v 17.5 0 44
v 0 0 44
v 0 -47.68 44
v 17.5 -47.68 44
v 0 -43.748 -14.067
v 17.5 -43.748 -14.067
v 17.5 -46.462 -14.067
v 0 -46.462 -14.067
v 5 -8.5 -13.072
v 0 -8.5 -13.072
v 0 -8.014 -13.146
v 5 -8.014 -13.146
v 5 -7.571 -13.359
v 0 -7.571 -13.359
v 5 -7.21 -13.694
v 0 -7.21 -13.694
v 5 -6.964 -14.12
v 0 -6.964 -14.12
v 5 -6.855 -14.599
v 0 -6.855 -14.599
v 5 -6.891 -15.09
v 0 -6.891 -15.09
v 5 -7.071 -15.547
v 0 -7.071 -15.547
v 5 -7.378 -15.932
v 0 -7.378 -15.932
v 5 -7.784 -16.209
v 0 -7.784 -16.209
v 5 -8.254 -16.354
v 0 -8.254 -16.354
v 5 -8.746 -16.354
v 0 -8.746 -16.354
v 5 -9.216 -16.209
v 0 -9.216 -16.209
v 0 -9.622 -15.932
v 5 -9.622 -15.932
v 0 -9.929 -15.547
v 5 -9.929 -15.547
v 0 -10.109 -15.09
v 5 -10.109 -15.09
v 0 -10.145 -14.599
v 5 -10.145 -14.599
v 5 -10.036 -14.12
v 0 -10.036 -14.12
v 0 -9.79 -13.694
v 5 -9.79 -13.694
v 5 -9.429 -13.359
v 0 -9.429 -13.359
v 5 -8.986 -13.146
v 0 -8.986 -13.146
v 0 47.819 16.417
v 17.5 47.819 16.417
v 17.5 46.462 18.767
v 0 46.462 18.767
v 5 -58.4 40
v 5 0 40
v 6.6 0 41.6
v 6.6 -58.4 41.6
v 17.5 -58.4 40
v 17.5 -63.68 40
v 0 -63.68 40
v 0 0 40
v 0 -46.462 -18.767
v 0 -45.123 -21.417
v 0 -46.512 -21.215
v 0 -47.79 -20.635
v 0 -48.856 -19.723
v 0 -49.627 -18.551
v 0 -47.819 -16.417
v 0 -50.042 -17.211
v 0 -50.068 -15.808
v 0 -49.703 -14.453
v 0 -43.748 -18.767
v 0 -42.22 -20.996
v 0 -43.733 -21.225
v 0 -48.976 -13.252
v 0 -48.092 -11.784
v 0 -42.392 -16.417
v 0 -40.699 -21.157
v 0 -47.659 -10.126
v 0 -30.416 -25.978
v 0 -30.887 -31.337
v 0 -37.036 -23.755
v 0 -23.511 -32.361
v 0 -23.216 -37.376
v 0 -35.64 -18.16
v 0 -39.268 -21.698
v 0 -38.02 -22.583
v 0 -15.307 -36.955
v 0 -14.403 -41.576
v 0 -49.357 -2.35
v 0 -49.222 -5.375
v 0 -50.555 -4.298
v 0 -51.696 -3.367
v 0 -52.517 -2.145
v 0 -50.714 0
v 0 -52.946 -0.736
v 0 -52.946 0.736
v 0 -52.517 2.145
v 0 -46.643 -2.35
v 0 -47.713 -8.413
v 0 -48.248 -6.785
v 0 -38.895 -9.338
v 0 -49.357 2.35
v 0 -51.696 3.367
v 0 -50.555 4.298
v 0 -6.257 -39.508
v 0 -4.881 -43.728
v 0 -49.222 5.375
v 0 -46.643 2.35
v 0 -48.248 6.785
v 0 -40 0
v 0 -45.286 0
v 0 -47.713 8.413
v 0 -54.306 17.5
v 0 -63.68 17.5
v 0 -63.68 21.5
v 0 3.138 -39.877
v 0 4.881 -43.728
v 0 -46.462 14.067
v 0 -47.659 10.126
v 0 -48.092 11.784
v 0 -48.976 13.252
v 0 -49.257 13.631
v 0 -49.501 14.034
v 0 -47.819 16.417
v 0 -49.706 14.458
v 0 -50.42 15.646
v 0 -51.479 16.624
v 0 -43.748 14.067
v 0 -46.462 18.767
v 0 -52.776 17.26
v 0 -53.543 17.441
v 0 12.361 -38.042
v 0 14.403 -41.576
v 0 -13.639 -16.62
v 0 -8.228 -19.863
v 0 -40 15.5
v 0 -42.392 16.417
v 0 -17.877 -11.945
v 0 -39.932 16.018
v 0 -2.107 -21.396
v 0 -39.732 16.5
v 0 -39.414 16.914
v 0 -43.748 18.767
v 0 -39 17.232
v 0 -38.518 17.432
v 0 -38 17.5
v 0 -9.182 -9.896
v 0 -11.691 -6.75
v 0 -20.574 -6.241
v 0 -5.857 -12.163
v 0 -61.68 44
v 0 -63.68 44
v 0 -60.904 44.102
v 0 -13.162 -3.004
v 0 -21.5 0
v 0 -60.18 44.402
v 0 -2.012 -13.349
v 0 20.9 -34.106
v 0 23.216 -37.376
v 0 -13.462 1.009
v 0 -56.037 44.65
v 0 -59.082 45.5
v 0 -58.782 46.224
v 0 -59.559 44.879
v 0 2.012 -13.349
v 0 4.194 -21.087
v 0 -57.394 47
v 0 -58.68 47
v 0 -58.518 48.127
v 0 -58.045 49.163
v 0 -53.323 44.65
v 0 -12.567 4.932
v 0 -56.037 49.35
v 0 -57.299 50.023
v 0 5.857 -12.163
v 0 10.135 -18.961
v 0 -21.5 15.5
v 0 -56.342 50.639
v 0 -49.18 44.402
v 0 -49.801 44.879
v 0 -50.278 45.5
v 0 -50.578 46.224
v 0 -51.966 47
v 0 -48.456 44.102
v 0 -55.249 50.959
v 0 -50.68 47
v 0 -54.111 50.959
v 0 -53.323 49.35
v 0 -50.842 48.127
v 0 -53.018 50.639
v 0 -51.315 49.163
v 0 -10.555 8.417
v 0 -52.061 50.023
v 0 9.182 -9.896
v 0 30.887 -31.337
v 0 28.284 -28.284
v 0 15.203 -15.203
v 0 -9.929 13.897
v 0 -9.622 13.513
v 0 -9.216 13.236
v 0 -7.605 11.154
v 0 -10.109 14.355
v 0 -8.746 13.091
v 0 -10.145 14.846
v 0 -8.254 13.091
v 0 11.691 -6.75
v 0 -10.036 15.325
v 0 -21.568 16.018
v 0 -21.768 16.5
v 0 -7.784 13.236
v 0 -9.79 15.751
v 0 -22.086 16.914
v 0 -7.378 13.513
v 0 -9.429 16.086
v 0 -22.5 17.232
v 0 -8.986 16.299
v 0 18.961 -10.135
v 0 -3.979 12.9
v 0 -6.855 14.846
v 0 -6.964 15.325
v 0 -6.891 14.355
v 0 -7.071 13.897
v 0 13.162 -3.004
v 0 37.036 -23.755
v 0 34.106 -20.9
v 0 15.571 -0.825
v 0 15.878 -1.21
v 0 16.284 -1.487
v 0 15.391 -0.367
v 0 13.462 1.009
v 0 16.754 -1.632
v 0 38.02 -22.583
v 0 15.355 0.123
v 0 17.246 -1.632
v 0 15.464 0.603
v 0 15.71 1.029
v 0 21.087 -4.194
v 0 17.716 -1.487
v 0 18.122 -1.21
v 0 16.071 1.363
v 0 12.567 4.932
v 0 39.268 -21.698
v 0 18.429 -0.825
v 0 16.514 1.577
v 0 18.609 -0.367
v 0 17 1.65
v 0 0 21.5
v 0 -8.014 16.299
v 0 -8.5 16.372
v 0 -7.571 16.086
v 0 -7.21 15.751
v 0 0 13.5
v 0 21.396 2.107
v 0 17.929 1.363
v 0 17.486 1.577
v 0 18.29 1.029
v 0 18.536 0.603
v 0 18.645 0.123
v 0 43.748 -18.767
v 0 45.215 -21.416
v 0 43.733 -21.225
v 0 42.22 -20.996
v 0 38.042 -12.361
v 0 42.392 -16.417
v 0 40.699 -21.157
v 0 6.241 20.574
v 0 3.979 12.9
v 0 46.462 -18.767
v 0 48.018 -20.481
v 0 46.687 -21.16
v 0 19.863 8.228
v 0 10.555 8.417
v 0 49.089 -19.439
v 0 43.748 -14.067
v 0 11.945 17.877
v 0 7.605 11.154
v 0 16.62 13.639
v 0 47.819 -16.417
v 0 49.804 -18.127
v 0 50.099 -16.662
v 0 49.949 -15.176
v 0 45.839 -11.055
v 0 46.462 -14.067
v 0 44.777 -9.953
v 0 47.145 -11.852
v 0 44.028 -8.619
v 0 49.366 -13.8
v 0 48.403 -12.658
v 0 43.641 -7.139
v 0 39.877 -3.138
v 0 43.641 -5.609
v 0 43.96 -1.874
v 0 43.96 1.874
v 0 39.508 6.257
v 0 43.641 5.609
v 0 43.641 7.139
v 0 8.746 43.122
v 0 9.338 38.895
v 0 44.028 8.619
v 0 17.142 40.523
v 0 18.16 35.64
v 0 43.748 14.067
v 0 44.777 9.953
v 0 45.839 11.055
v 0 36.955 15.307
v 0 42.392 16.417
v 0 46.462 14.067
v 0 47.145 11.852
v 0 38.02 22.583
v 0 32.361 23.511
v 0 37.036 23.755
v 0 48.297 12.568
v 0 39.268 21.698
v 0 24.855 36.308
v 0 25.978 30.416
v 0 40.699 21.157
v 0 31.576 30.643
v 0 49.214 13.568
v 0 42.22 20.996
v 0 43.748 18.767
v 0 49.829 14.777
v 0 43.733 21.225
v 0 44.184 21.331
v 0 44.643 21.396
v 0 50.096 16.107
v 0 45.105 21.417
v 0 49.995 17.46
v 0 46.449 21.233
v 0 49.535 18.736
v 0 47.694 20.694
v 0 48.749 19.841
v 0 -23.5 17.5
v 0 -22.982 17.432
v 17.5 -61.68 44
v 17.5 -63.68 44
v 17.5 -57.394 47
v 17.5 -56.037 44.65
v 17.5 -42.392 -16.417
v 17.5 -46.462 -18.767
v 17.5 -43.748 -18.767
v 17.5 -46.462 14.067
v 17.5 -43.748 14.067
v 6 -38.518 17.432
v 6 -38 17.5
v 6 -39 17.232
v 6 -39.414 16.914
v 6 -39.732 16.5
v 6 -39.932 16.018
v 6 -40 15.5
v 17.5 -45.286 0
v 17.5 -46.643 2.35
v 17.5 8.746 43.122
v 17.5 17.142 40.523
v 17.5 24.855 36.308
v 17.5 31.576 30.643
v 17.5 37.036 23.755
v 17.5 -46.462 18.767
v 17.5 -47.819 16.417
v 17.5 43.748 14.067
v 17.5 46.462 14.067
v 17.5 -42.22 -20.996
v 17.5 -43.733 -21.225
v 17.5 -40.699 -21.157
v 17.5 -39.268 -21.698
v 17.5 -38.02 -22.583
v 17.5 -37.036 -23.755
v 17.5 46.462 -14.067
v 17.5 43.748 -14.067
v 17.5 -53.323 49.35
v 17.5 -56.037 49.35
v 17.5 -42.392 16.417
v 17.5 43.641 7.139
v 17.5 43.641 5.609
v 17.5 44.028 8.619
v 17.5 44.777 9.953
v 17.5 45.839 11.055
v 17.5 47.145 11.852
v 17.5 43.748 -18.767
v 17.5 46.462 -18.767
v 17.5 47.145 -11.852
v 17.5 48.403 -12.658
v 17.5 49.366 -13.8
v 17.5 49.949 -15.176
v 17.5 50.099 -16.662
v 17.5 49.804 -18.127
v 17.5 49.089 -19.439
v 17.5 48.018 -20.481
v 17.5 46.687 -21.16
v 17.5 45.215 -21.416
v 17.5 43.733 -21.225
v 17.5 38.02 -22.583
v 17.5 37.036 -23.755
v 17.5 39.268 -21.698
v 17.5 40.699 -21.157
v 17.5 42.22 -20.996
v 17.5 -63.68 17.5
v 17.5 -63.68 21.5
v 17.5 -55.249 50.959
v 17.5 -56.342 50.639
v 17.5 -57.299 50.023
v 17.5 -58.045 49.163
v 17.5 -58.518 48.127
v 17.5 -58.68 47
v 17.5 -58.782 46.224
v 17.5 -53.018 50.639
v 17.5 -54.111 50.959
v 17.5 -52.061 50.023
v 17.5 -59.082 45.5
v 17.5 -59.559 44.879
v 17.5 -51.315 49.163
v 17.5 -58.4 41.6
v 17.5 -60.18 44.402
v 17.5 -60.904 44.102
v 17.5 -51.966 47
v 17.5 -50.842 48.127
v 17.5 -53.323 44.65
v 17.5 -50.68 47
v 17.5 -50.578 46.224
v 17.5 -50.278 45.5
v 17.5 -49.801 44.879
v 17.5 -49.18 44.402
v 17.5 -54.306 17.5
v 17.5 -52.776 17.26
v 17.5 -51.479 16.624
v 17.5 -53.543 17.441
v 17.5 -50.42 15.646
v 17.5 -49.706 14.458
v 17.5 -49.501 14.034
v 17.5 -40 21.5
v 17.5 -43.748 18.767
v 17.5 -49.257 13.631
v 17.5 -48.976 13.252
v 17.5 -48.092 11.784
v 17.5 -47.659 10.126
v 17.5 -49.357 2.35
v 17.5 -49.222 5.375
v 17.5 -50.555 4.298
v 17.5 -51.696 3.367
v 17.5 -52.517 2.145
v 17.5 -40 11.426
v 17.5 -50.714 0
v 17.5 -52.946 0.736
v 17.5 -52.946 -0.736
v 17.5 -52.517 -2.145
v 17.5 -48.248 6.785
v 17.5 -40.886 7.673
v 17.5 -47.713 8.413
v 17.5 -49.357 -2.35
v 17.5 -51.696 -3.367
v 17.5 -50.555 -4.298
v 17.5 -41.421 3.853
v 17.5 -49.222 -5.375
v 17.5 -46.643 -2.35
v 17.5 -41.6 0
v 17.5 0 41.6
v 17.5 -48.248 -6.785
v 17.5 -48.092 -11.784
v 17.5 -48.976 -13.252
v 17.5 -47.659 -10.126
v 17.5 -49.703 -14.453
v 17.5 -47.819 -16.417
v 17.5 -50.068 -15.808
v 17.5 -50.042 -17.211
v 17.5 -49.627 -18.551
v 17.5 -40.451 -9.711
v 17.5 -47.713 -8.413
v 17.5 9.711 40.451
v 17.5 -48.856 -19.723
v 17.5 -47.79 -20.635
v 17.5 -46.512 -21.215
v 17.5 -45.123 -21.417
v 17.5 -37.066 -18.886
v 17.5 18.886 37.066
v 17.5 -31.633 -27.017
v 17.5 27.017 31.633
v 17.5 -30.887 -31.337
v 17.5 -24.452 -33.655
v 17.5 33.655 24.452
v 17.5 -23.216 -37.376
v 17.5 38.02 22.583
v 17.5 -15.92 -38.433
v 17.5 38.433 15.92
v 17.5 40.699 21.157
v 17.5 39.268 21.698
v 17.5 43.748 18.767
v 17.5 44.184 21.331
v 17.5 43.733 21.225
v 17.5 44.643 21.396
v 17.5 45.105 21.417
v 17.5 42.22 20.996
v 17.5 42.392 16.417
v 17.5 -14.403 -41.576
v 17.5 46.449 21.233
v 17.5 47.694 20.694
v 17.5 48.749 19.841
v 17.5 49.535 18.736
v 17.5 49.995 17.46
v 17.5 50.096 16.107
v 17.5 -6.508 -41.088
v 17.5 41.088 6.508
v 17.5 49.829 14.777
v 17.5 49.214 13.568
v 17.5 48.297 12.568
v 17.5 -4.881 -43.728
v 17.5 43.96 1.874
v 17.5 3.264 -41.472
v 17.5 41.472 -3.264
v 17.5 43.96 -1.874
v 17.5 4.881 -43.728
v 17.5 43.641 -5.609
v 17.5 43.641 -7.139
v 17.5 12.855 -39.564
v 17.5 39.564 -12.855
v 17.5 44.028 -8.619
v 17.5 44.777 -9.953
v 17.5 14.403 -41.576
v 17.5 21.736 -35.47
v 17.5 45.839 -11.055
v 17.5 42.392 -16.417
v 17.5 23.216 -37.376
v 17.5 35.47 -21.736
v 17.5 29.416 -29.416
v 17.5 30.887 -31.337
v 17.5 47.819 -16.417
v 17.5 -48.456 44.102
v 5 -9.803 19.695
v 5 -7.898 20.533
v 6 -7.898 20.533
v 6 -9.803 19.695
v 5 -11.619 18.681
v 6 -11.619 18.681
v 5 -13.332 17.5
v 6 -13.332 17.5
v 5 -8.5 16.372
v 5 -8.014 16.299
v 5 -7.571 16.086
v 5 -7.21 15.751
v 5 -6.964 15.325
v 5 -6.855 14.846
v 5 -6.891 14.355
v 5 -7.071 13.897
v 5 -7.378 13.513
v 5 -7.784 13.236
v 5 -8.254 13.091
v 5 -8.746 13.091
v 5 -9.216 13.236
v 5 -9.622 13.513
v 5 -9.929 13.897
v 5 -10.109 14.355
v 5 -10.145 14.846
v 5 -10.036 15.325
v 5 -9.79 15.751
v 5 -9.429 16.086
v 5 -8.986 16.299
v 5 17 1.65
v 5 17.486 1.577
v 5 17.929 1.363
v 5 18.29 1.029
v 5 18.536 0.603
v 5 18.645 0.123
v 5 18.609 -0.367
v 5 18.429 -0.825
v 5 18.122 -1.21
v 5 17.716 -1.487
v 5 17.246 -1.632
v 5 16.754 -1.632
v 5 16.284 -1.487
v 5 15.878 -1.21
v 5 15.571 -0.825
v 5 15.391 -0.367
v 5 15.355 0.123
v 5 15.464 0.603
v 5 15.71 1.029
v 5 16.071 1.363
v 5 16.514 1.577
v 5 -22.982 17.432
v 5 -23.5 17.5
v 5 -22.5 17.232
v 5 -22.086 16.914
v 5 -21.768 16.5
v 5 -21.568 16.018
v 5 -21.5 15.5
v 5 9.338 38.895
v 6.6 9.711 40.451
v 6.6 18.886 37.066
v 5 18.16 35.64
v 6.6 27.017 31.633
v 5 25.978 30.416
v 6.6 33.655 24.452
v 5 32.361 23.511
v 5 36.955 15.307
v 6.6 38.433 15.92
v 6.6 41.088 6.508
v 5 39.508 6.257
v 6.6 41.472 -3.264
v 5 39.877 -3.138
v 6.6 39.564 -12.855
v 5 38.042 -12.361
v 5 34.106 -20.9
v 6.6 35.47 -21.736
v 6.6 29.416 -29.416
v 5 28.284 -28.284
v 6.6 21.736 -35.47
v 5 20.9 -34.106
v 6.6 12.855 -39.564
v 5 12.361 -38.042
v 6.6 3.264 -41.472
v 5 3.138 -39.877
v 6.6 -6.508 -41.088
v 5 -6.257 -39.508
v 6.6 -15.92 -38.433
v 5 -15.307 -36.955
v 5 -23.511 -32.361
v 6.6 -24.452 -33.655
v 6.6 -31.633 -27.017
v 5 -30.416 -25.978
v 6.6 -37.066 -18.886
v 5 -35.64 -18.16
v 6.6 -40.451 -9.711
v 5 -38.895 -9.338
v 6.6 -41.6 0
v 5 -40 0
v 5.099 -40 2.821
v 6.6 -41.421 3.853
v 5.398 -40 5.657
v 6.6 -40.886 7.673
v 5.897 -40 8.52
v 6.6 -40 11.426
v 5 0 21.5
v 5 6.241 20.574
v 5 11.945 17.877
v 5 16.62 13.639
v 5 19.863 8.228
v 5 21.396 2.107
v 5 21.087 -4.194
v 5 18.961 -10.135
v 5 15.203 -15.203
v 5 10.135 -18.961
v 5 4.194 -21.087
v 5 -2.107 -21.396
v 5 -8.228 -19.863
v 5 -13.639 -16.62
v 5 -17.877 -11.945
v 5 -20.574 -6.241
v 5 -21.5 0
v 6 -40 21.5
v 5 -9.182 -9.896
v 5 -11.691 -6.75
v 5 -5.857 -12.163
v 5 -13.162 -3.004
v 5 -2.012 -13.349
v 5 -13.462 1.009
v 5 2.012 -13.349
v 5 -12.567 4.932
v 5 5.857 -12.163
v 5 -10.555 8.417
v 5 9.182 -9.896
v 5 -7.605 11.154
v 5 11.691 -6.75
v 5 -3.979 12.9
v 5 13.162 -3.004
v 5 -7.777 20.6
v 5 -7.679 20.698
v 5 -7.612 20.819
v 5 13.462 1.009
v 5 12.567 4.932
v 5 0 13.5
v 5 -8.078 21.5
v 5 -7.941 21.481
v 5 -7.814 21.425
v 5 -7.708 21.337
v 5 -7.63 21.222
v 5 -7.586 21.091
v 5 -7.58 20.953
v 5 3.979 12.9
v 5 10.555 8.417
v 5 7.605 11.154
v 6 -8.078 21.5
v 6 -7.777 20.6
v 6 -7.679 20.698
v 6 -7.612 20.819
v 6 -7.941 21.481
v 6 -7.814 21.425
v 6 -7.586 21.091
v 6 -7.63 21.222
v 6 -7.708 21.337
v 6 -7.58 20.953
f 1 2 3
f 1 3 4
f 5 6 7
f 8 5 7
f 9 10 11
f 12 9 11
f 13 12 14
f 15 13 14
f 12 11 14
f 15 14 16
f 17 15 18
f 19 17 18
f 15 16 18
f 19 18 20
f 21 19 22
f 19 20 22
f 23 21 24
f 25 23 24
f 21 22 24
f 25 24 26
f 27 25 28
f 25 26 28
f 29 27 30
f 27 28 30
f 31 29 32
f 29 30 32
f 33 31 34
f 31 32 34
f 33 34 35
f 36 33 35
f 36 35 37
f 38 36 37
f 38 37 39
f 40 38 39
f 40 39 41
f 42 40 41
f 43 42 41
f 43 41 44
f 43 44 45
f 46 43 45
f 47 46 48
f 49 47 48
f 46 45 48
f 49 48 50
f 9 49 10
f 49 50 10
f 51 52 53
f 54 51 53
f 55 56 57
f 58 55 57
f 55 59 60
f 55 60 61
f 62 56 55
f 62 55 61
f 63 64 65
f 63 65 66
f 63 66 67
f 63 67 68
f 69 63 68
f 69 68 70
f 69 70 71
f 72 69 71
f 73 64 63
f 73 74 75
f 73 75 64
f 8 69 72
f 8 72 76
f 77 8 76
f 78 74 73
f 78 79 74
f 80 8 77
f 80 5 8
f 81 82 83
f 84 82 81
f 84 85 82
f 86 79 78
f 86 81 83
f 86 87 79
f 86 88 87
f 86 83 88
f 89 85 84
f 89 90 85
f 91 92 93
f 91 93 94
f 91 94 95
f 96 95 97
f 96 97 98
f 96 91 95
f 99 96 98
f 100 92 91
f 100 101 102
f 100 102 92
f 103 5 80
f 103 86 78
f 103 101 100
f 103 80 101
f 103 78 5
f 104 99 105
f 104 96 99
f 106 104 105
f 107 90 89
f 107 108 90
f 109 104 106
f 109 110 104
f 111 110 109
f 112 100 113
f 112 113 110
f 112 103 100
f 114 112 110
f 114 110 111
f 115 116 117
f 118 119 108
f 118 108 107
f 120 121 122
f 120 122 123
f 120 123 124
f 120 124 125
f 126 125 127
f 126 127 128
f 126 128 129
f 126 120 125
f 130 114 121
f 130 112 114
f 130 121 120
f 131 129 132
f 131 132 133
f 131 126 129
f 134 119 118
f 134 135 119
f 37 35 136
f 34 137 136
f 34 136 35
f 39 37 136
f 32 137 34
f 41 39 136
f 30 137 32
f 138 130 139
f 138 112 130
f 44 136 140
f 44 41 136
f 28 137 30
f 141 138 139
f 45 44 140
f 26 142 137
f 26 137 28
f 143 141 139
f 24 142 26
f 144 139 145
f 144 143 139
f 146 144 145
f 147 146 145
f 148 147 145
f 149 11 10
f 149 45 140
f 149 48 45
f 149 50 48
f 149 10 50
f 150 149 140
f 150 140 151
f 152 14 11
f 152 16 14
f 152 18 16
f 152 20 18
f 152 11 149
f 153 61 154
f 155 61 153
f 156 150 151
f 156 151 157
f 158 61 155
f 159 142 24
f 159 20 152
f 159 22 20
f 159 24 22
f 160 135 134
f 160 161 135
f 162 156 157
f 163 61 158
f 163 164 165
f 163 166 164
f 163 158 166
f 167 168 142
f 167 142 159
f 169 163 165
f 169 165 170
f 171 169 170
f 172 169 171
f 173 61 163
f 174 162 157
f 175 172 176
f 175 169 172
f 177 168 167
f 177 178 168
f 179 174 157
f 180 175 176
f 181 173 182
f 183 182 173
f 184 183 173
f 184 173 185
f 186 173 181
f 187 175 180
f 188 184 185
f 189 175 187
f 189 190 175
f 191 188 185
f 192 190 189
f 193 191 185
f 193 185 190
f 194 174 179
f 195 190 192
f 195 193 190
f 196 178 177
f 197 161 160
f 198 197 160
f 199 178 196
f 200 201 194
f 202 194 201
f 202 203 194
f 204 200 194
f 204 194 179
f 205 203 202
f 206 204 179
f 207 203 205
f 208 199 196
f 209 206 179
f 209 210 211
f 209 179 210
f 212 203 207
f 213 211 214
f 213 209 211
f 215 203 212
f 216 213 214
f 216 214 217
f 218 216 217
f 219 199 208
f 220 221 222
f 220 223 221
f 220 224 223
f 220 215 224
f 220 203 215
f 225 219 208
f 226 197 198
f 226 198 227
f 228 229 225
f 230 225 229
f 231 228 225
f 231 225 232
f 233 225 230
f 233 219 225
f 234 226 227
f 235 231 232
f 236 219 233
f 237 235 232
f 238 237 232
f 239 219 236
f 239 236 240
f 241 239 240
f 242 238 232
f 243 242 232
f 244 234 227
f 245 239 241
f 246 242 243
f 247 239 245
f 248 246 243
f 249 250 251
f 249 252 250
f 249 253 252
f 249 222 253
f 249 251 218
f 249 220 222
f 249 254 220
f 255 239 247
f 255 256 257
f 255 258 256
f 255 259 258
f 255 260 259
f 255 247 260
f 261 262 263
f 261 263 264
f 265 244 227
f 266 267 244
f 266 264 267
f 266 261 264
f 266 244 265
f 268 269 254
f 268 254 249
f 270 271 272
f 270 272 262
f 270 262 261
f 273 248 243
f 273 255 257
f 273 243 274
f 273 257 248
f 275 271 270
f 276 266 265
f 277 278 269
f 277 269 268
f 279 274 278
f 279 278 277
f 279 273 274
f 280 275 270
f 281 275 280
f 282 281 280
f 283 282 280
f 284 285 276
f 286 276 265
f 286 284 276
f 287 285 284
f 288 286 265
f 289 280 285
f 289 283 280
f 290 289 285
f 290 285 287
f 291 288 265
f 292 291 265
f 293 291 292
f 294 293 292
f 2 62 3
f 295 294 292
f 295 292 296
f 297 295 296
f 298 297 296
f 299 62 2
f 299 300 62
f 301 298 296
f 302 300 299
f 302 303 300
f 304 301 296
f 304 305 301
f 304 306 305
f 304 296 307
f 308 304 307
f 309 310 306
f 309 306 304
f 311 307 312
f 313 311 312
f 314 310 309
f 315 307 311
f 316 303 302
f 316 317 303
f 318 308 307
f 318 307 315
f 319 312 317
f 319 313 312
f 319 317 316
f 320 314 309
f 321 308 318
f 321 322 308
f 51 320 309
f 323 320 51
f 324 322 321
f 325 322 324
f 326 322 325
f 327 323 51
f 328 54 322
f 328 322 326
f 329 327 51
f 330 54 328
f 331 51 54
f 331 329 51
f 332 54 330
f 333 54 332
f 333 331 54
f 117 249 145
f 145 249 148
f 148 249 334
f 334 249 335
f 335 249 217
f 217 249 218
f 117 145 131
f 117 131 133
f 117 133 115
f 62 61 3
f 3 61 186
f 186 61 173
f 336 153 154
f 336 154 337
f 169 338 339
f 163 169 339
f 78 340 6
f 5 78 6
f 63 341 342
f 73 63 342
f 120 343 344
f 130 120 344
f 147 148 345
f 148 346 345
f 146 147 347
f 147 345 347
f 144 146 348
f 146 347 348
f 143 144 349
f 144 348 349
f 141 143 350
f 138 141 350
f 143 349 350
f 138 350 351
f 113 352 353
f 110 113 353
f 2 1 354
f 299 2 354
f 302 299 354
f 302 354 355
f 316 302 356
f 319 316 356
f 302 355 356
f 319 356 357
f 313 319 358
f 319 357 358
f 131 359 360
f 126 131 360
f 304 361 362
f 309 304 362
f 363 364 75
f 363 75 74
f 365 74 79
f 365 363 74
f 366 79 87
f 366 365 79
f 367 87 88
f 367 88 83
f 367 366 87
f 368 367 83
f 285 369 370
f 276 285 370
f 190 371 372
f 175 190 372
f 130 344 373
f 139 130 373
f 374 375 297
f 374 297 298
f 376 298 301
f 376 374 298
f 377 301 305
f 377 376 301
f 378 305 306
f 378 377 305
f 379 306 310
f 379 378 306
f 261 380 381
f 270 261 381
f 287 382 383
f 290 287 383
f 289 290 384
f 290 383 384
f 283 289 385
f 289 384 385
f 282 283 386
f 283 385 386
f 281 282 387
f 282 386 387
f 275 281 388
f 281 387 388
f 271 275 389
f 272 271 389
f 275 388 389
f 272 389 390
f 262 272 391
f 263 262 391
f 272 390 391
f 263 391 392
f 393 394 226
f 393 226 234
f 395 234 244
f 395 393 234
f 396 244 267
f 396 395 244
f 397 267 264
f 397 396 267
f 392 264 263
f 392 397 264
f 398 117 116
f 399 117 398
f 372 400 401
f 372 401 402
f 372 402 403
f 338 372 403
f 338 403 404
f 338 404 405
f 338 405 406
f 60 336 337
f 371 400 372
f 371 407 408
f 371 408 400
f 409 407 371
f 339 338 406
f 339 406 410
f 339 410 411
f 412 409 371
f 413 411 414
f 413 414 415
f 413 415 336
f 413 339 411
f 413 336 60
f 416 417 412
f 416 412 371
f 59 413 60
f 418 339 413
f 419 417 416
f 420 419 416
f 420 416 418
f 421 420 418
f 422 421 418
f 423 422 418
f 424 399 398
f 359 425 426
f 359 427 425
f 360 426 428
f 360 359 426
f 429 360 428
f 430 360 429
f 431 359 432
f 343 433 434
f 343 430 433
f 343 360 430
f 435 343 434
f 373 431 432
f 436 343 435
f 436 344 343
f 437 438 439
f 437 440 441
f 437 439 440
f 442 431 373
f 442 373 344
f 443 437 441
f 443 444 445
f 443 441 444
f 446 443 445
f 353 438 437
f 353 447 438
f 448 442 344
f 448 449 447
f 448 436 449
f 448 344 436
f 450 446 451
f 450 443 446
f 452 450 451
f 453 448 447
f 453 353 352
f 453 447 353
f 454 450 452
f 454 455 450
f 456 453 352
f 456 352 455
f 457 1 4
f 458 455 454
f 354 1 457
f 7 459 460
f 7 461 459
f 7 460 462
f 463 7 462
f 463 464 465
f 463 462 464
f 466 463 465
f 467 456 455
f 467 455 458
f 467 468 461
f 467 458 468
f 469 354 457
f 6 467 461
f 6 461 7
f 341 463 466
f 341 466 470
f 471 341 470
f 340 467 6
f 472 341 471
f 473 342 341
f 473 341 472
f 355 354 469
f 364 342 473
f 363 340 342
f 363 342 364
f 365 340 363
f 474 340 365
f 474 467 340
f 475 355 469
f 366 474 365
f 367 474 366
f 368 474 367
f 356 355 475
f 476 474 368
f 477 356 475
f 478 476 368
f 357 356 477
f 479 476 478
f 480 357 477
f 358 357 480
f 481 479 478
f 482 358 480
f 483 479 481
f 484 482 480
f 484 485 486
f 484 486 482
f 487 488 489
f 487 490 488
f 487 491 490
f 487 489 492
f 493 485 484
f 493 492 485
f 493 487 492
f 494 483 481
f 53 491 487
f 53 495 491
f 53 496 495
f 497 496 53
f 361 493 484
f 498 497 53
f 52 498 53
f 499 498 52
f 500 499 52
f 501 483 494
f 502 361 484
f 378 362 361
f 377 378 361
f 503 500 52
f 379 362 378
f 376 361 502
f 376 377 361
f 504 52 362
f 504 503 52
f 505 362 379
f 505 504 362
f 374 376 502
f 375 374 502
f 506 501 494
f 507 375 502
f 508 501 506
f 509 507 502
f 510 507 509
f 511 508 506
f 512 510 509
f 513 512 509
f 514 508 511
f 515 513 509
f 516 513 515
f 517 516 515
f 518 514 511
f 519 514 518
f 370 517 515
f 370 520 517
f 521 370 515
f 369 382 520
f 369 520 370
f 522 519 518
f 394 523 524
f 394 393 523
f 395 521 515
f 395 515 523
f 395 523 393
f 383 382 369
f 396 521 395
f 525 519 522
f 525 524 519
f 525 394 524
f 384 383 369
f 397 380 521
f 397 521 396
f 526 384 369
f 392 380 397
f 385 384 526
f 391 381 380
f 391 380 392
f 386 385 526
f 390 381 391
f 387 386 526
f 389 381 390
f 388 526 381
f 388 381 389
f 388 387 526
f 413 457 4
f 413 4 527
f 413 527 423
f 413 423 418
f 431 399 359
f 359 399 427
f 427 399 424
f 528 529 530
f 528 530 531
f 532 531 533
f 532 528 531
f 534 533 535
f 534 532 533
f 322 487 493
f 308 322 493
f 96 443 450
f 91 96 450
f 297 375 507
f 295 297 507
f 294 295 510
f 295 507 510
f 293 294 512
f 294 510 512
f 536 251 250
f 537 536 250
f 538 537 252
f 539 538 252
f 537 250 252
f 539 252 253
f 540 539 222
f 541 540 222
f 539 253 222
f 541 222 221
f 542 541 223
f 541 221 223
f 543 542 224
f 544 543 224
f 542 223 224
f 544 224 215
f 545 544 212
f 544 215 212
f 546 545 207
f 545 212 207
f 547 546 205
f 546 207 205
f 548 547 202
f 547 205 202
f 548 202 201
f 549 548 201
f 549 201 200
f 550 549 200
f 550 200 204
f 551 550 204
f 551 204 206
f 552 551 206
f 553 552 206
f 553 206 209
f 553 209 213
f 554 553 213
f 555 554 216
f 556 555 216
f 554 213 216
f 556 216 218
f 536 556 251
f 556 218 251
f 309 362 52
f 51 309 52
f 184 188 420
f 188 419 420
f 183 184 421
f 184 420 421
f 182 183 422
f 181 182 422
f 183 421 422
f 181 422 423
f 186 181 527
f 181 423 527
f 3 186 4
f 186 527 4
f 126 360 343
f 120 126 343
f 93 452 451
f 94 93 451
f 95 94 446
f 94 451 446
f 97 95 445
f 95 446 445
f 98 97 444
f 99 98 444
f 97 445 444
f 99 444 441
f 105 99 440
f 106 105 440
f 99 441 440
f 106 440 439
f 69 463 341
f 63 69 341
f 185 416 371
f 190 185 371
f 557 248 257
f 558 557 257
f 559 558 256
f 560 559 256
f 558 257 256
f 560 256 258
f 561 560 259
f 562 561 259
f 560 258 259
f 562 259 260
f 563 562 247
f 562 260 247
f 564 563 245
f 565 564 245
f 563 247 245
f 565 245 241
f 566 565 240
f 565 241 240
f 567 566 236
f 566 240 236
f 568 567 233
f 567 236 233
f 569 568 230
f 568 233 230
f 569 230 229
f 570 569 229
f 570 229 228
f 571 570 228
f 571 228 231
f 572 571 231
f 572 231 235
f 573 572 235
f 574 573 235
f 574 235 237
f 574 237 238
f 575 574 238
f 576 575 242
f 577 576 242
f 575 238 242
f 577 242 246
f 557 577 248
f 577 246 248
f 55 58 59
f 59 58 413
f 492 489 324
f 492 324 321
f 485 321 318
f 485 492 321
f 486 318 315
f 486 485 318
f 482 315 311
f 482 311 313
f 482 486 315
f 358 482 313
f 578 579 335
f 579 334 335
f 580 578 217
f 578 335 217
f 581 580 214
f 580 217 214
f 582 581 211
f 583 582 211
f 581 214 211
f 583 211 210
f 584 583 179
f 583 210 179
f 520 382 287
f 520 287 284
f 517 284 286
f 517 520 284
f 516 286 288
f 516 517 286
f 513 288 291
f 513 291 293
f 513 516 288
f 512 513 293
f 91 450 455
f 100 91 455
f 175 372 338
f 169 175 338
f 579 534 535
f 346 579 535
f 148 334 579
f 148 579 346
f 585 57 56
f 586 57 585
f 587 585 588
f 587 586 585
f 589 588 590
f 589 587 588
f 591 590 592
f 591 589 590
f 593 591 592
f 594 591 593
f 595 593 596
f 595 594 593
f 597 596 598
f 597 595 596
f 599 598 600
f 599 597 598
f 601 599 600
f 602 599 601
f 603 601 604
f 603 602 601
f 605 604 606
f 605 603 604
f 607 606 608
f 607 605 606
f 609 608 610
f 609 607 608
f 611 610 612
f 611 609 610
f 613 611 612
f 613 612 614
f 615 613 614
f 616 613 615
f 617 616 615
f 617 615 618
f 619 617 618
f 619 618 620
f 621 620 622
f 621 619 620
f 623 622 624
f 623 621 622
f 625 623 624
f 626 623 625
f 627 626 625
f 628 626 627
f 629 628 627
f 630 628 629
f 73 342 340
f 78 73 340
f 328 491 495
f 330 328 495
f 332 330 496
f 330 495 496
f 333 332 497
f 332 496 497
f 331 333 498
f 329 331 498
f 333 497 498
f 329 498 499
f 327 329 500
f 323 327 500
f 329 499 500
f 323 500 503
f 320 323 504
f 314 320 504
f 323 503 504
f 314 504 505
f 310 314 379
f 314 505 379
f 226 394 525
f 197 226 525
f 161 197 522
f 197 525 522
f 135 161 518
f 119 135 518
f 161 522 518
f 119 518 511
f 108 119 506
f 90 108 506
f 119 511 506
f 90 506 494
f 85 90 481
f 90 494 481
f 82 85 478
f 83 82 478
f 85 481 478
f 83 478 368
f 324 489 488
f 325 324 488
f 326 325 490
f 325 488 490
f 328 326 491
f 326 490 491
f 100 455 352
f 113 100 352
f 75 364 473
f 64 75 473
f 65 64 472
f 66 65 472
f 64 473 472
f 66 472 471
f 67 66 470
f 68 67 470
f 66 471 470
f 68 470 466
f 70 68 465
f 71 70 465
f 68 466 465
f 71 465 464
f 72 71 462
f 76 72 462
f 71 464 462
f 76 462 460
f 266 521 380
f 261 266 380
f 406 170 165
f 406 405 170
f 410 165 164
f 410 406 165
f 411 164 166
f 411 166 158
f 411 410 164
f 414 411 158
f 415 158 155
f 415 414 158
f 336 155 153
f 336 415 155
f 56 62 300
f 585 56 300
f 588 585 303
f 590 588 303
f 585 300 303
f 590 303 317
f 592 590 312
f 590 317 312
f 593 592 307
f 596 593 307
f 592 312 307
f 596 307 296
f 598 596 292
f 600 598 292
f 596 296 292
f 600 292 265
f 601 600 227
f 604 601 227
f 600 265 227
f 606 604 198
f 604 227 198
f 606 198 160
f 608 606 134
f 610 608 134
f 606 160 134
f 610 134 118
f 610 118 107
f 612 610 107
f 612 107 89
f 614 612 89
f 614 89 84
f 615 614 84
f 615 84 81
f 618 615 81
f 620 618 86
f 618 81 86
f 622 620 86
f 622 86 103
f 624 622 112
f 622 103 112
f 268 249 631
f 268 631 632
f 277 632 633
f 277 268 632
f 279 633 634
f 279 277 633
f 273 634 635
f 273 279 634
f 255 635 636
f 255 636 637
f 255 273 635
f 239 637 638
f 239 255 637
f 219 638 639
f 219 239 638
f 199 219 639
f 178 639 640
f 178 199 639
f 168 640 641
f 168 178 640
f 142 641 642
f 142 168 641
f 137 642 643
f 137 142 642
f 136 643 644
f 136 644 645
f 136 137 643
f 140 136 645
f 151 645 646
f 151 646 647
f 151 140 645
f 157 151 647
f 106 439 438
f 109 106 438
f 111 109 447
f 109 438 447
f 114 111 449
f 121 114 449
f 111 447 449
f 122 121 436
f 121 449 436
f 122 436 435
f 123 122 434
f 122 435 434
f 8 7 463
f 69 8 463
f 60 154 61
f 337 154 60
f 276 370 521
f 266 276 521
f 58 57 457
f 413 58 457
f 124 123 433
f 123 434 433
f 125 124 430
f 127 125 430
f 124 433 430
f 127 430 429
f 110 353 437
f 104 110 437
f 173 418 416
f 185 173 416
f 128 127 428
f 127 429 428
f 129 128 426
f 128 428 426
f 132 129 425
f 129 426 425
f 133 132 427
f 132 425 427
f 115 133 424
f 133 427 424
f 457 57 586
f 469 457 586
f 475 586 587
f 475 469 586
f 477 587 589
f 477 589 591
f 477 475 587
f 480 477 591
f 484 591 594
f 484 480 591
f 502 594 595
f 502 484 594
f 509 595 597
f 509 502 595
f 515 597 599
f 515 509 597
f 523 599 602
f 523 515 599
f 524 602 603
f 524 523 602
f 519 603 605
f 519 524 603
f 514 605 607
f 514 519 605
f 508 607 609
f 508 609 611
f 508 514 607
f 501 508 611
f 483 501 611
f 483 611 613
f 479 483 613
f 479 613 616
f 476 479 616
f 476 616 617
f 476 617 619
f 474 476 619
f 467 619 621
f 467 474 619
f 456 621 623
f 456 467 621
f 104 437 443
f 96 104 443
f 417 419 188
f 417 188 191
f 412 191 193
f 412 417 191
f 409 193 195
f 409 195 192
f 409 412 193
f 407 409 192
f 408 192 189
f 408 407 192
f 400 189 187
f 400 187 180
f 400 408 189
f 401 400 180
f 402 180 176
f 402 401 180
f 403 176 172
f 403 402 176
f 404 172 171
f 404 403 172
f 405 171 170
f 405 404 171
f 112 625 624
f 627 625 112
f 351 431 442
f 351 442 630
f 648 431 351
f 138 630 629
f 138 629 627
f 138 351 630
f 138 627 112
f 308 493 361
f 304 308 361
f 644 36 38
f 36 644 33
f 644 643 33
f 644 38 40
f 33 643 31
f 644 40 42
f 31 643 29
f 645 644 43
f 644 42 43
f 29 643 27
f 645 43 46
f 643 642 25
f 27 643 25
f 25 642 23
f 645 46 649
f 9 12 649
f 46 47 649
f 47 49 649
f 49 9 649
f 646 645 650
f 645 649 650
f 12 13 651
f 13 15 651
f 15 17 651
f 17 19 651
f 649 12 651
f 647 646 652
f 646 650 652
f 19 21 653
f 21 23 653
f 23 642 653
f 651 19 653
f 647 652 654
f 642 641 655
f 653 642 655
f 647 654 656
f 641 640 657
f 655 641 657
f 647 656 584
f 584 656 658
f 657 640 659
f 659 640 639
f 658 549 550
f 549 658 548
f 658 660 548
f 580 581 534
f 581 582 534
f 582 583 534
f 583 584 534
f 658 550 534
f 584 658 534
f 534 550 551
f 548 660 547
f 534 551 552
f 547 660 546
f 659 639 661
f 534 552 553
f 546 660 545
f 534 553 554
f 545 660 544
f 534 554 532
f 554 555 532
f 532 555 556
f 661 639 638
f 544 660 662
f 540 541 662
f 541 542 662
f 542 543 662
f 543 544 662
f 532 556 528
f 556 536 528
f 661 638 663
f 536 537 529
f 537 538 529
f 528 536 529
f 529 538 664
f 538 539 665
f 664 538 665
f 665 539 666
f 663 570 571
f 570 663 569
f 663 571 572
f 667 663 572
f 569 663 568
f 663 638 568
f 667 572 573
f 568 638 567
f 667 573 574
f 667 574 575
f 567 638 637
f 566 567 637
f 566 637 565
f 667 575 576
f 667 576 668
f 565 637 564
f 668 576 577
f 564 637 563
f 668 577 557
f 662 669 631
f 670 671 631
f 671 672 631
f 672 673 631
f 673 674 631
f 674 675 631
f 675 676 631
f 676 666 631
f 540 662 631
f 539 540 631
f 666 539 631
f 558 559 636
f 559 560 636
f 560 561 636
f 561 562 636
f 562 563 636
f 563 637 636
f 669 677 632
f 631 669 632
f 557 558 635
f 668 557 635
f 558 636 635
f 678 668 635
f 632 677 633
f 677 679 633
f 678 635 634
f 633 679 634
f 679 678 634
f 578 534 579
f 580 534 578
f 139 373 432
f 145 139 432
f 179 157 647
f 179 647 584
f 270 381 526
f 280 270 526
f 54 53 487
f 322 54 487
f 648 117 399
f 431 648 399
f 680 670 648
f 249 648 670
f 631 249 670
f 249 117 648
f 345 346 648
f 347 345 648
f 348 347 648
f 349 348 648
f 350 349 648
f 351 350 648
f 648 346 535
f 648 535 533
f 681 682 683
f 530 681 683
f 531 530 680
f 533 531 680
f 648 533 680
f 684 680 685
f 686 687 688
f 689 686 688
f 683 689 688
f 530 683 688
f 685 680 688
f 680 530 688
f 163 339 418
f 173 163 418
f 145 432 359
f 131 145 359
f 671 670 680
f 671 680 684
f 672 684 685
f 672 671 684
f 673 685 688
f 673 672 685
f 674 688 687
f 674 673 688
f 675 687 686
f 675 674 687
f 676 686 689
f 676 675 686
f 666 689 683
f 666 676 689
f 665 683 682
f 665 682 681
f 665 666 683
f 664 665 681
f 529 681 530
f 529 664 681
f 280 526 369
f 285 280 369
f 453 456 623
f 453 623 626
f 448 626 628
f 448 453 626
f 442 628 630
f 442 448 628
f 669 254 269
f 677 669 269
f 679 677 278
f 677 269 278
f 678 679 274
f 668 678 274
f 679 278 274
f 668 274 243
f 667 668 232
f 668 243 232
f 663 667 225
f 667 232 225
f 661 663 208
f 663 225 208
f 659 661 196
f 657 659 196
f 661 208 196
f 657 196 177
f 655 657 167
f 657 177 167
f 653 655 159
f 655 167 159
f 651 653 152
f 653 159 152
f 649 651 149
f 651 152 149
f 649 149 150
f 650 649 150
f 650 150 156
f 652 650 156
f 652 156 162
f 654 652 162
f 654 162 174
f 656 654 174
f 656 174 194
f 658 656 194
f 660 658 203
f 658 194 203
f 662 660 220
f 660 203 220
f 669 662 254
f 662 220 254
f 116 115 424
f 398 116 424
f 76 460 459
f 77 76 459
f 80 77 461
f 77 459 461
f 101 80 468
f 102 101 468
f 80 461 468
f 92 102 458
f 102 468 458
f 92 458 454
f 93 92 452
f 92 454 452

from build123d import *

# Parameters (mm, degrees)
SKETCH_2_W           = 17.5
SKETCH_2_H           = 4
EXTRUDE_1_DEPTH      = 6
SKETCH_6_R           = 13.5
SKETCH_6_R_2         = 1.65
EXTRUDE_2_DEPTH      = 5
FILLET_1_R           = 2
EXTRUDE_START        = -17.5
SKETCH_7_R           = 5
EXTRUDE_3_DEPTH      = 17.5
FILLET_2_R           = 6
CUT_EXTRUDE_1_DEPTH  = 72.072146443
SKETCH_9_W           = 17.5
SKETCH_9_H           = 4
EXTRUDE_4_DEPTH      = 11.4
FILLET_3_R           = 5
EXTRUDE_5_DEPTH      = 0.28
EXTRUDE_5_DEPTH_BACK = 5
SKETCH_10_W          = 17.5
SKETCH_10_H          = 4
SKETCH_11_R          = 4
EXTRUDE_6_DEPTH      = 17.5
FILLET_4_R           = 3


with BuildPart() as part:
    # Sweep 1: sweep along a path in 草图1
    with BuildLine(Plane(origin=(0, 0, 0), x_dir=(0, 0, -1), z_dir=(1, 0, 0))) as sweep_1_path:
        Line((-44, -52), (-44, 0))
        ThreePointArc((-44, 0), (31.112698372, 31.112698372), (0, -44))
        Line((0, -44), (-17.5, -44))
        Line((-17.5, -44), (-17.5, -52))
    # 草图2 → Sweep 1 (sweep)
    with BuildSketch(Plane(origin=(0, -52, 0), x_dir=(1, 0, 0), z_dir=(0, 1, 0))):
        with Locations((8.75, -42)):
            Rectangle(SKETCH_2_W, SKETCH_2_H)
    sweep(path=sweep_1_path.line, transition=Transition.RIGHT)

    # Sweep 1 2: sweep along a path in 草图4
    with BuildLine(Plane.ZY) as sweep_1_2_path:
        Line((44, -52), (44, 0))
        ThreePointArc((44, 0), (-31.112698372, 31.112698372), (0, -44))
        ThreePointArc((0, -44), (12.692125838, -42.129680057), (24.3052364, -36.677724623))
    # 草图3 → Sweep 1 2 (sweep, cut)
    with BuildSketch(Plane(origin=(0, -52, 0), x_dir=(1, 0, 0), z_dir=(0, 1, 0))):
        Polygon((17.5, -40), (5, -40), (6.6, -41.6), (17.5, -41.6), align=None)
    sweep(path=sweep_1_2_path.line, mode=Mode.SUBTRACT)

    # 草图5 → 凸台-拉伸1 (add)
    with BuildSketch(Plane.ZY):
        with BuildLine():
            Line((21.5, -40), (21.5, -8.077747211))
            ThreePointArc((21.5, -8.077747211), (21.091287093, -7.586151171), (20.533333333, -7.898241717))
            ThreePointArc((20.533333333, -7.898241717), (19.209784895, -10.723066925), (17.5, -13.332291626))
            Line((17.5, -13.332291626), (17.5, -40))
            Line((17.5, -40), (21.5, -40))
        make_face()
    extrude(amount=-EXTRUDE_1_DEPTH)

    # 草图6 → 凸台-拉伸2 (add)
    with BuildSketch(Plane.ZY):
        with BuildLine():
            Line((21.5, -21.5), (21.5, -8.077747211))
            Line((21.5, -8.077747211), (21.5, 0))
            ThreePointArc((21.5, 0), (-15.202795796, 15.202795796), (0, -21.5))
            Line((0, -21.5), (21.5, -21.5))
        make_face()
        Circle(SKETCH_6_R, mode=Mode.SUBTRACT)
        with Locations((0, 17)):
            Circle(SKETCH_6_R_2, mode=Mode.SUBTRACT)
        with Locations((14.722431864, -8.5)):
            Circle(SKETCH_6_R_2, mode=Mode.SUBTRACT)
        with Locations((-14.722431864, -8.5)):
            Circle(SKETCH_6_R_2, mode=Mode.SUBTRACT)
    extrude(amount=-EXTRUDE_2_DEPTH)

    # 圆角1
    fillet_1_edges = [part.edges().sort_by_distance(p)[0] for p in [
        (3, -40, 17.5),
        (2.5, -21.5, 17.5),
    ]]
    fillet(fillet_1_edges, radius=FILLET_1_R)

    # 草图7 → 凸台-拉伸3 (add)
    # profile 1 of 7: a face of its own
    with BuildSketch(Plane.ZY.offset(EXTRUDE_START)):
        with BuildLine():
            ThreePointArc((-11.41696688, -45.105245798), (-11.647855738, -43.60338731), (-12.319198447, -42.240233778))
            ThreePointArc((-12.319198447, -42.240233778), (-15.048886306, -41.346475315), (-17.714445389, -40.276524485))
            ThreePointArc((-17.714445389, -40.276524485), (-20.865936265, -47.387058983), (-13.252416867, -48.976372665))
            ThreePointArc((-13.252416867, -48.976372665), (-11.899071902, -47.247353398), (-11.41696688, -45.105245798))
        make_face()
        Polygon((-14.06696688, -46.46201893), (-16.41696688, -47.818792063), (-18.76696688, -46.46201893), (-18.76696688, -43.748472665), (-16.41696688, -42.391699533), (-14.06696688, -43.748472665), align=None, mode=Mode.SUBTRACT)
    # profile 2 of 7: a face of its own
    with BuildSketch(Plane.ZY.offset(EXTRUDE_START)):
        with BuildLine():
            ThreePointArc((-4.29770766, -50.555329502), (-4.888687372, -46.950840441), (-2.870750936, -43.90625))
            ThreePointArc((-2.870750936, -43.90625), (-7.640519817, -43.331541133), (-12.319198447, -42.240233778))
            ThreePointArc((-12.319198447, -42.240233778), (-11.647855738, -43.60338731), (-11.41696688, -45.105245798))
            ThreePointArc((-11.41696688, -45.105245798), (-11.899071902, -47.247353398), (-13.252416867, -48.976372665))
            ThreePointArc((-13.252416867, -48.976372665), (-8.413067787, -47.712878387), (-4.29770766, -50.555329502))
        make_face()
    # profile 3 of 7: a face of its own
    with BuildSketch(Plane.ZY.offset(EXTRUDE_START)):
        with BuildLine():
            ThreePointArc((5, -48), (4.472135955, -45.763932023), (3, -44))
            ThreePointArc((3, -44), (1.58113883, -43.25658351), (0, -43))
            Line((0, -43), (0, -44))
            ThreePointArc((0, -44), (-1.436140662, -43.976556254), (-2.870750936, -43.90625))
            ThreePointArc((-2.870750936, -43.90625), (-4.888687372, -46.950840441), (-4.29770766, -50.555329502))
            ThreePointArc((-4.29770766, -50.555329502), (0, -53), (4.29770766, -50.555329502))
            ThreePointArc((4.29770766, -50.555329502), (4.821231083, -49.325039942), (5, -48))
        make_face()
        Polygon((-2.35, -46.643226867), (0, -45.286453735), (2.35, -46.643226867), (2.35, -49.356773133), (0, -50.713546265), (-2.35, -49.356773133), align=None, mode=Mode.SUBTRACT)
    # profile 4 of 7: a face of its own
    with BuildSketch(Plane.ZY.offset(EXTRUDE_START)):
        with BuildLine():
            Line((11.540653546, -44), (3, -44))
            ThreePointArc((3, -44), (4.472135955, -45.763932023), (5, -48))
            ThreePointArc((5, -48), (4.821231083, -49.325039942), (4.29770766, -50.555329502))
            ThreePointArc((4.29770766, -50.555329502), (8.413067787, -47.712878387), (13.252416867, -48.976372665))
            ThreePointArc((13.252416867, -48.976372665), (11.688865563, -46.731609207), (11.540653546, -44))
        make_face()
    # profile 5 of 7: a face of its own
    with BuildSketch(Plane.ZY.offset(EXTRUDE_START)):
        with Locations((16.41696688, -45.105245798)):
            Circle(SKETCH_7_R)
        Polygon((18.76696688, -46.46201893), (16.41696688, -47.818792063), (14.06696688, -46.46201893), (14.06696688, -43.748472665), (16.41696688, -42.391699533), (18.76696688, -43.748472665), align=None, mode=Mode.SUBTRACT)
    # profile 6 of 7: a face of its own
    with BuildSketch(Plane.ZY.offset(EXTRUDE_START)):
        with BuildLine():
            ThreePointArc((-11.41696688, 45.105245798), (-19.459384295, 49.07307849), (-17.714445389, 40.276524485))
            ThreePointArc((-17.714445389, 40.276524485), (-15.048886306, 41.346475315), (-12.319198447, 42.240233778))
            ThreePointArc((-12.319198447, 42.240233778), (-11.647855738, 43.60338731), (-11.41696688, 45.105245798))
        make_face()
        Polygon((-18.76696688, 43.748472665), (-18.76696688, 46.46201893), (-16.41696688, 47.818792063), (-14.06696688, 46.46201893), (-14.06696688, 43.748472665), (-16.41696688, 42.391699533), align=None, mode=Mode.SUBTRACT)
    # profile 7 of 7: a face of its own
    with BuildSketch(Plane.ZY.offset(EXTRUDE_START)):
        with BuildLine():
            ThreePointArc((21.41696688, 45.105245798), (14.915108391, 49.874356939), (12.319198447, 42.240233778))
            ThreePointArc((12.319198447, 42.240233778), (15.048886306, 41.346475315), (17.714445389, 40.276524485))
            ThreePointArc((17.714445389, 40.276524485), (20.384799572, 42.062828383), (21.41696688, 45.105245798))
        make_face()
        Polygon((14.06696688, 46.46201893), (16.41696688, 47.818792063), (18.76696688, 46.46201893), (18.76696688, 43.748472665), (16.41696688, 42.391699533), (14.06696688, 43.748472665), align=None, mode=Mode.SUBTRACT)
    extrude(amount=EXTRUDE_3_DEPTH)

    # 圆角2
    # the kernel refuses this fillet: 6 mm, written as the material it adds along each edge
    with BuildSketch(Plane(origin=(17.5, 40.276524485, -17.714445389), x_dir=(0, -0.4726837072692949, -0.8812321560645388), z_dir=(-1, 0, 0)), Plane(origin=(17.5, 42.240233778, 12.319198447), x_dir=(0, 0.20434838386912327, -0.978898226584397), z_dir=(-1, 0, 0))) as fillet_2_piece_1:
        with BuildLine():
            CenterArc((7.322424831, -5.98176794), FILLET_2_R, 94.467760731, 73.250864603)
            Line((1.459736191, -4.705491359), (1.342482418, -4.679965828))
            ThreePointArc((1.342482418, -4.679965828), (1.235040355, -2.196031285), (-0.082220104, -0.087406261))
            Line((-0.082220104, -0.087406261), (0.009347776, 0.119635359))
            ThreePointArc((0.009347776, 0.119635359), (3.427518006, -0.013701771), (6.845688236, 0.119635359))
            Line((6.845688236, 0.119635359), (6.855036012, 0))
        make_face()
    extrude(amount=17.5)
    with BuildSketch(Plane(origin=(17.5, 42.240233778, -12.319198447), x_dir=(0, 0.20434838386906956, 0.9788982265844082), z_dir=(-1, 0, 0)), Plane(origin=(17.5, 40.276524485, 17.714445389), x_dir=(0, -0.47268370726929204, 0.8812321560645403), z_dir=(-1, 0, 0)), Plane(origin=(17.5, -40.276524485, -17.714445389), x_dir=(0, 0.47268370726929143, -0.8812321560645405), z_dir=(-1, 0, 0))) as fillet_2_piece_2:
        with BuildLine():
            CenterArc((7.322424831, 5.98176794), FILLET_2_R, 192.281374666, 73.250864603)
            Line((1.459736191, 4.705491359), (1.342482418, 4.679965828))
            ThreePointArc((1.342482418, 4.679965828), (1.235040355, 2.196031285), (-0.082220104, 0.087406261))
            Line((-0.082220104, 0.087406261), (0.009347776, -0.119635359))
            ThreePointArc((0.009347776, -0.119635359), (3.427518006, 0.013701771), (6.845688236, -0.119635359))
            Line((6.845688236, -0.119635359), (6.855036012, 0))
        make_face()
    extrude(amount=17.5)
    with BuildSketch(Plane(origin=(0, -49.986540632, 17.5), x_dir=(0, -1, 0), z_dir=(1, 0, 0))) as fillet_2_piece_3:
        with BuildLine():
            CenterArc((5.420881339, 4.938570189), FILLET_2_R, 200.518106547, 34.877722735)
            Line((-0.198487483, 2.83554997), (-0.310874859, 2.793489565))
            ThreePointArc((-0.310874859, 2.793489565), (-0.013206953, 1.423797529), (-0.117151076, 0.025992795))
            Line((-0.117151076, 0.025992795), (0, -0.12))
            ThreePointArc((0, -0.12), (1.006729684, -0.12), (1.945310928, -0.098771404))
            Line((1.945310928, -0.098771404), (2.013459368, 0))
        make_face()
    extrude(amount=17.5)

    # 草图8 → 切除-拉伸1 (cut, through all)
    with BuildSketch(Plane(origin=(17.5, 0, 0), x_dir=(0, 0, -1), z_dir=(1, 0, 0))):
        Polygon((-14.06696688, -46.46201893), (-14.06696688, -43.748472665), (-16.41696688, -42.391699533), (-18.76696688, -43.748472665), (-18.76696688, -46.46201893), (-16.41696688, -47.818792063), align=None)
    extrude(amount=-CUT_EXTRUDE_1_DEPTH, mode=Mode.SUBTRACT)

    # 草图9 → 凸台-拉伸4 (add)
    with BuildSketch(Plane.XZ.offset(52)):
        with Locations((8.75, 19.5)):
            Rectangle(SKETCH_9_W, SKETCH_9_H)
        Polygon((6.6, 41.6), (17.5, 41.6), (17.5, 44), (0, 44), (0, 40), (5, 40), align=None)
    extrude(amount=EXTRUDE_4_DEPTH)

    # 圆角3
    fillet_3_edges = [part.edges().sort_by_distance(p)[0] for p in [
        (8.75, -52, 17.5),
    ]]
    fillet(fillet_3_edges, radius=FILLET_3_R)

    # 草图10 → 凸台-拉伸5 (add, two sides: drawn at the far end of the back side and taken through both)
    with BuildSketch(Plane.XZ.offset(63.4).offset(-EXTRUDE_5_DEPTH_BACK)):
        with Locations((8.75, 42)):
            Rectangle(SKETCH_10_W, SKETCH_10_H)
        with Locations((8.75, 19.5)):
            Rectangle(SKETCH_10_W, SKETCH_10_H)
    extrude(amount=EXTRUDE_5_DEPTH + EXTRUDE_5_DEPTH_BACK)

    # 草图11 → 凸台-拉伸6 (add)
    with BuildSketch(Plane(origin=(17.5, 0, 0), x_dir=(0, 0, -1), z_dir=(1, 0, 0))):
        with Locations((-47, -54.68)):
            Circle(SKETCH_11_R)
        Polygon((-44.65, -53.323226867), (-47, -51.966453735), (-49.35, -53.323226867), (-49.35, -56.036773133), (-47, -57.393546265), (-44.65, -56.036773133), align=None, mode=Mode.SUBTRACT)
    extrude(amount=-EXTRUDE_6_DEPTH)

    # 圆角4
    fillet_4_edges = [part.edges().sort_by_distance(p)[0] for p in [
        (8.75, -52.034248689, 44),
        (8.75, -57.325751311, 44),
    ]]
    fillet(fillet_4_edges, radius=FILLET_4_R)


solid = part.part
